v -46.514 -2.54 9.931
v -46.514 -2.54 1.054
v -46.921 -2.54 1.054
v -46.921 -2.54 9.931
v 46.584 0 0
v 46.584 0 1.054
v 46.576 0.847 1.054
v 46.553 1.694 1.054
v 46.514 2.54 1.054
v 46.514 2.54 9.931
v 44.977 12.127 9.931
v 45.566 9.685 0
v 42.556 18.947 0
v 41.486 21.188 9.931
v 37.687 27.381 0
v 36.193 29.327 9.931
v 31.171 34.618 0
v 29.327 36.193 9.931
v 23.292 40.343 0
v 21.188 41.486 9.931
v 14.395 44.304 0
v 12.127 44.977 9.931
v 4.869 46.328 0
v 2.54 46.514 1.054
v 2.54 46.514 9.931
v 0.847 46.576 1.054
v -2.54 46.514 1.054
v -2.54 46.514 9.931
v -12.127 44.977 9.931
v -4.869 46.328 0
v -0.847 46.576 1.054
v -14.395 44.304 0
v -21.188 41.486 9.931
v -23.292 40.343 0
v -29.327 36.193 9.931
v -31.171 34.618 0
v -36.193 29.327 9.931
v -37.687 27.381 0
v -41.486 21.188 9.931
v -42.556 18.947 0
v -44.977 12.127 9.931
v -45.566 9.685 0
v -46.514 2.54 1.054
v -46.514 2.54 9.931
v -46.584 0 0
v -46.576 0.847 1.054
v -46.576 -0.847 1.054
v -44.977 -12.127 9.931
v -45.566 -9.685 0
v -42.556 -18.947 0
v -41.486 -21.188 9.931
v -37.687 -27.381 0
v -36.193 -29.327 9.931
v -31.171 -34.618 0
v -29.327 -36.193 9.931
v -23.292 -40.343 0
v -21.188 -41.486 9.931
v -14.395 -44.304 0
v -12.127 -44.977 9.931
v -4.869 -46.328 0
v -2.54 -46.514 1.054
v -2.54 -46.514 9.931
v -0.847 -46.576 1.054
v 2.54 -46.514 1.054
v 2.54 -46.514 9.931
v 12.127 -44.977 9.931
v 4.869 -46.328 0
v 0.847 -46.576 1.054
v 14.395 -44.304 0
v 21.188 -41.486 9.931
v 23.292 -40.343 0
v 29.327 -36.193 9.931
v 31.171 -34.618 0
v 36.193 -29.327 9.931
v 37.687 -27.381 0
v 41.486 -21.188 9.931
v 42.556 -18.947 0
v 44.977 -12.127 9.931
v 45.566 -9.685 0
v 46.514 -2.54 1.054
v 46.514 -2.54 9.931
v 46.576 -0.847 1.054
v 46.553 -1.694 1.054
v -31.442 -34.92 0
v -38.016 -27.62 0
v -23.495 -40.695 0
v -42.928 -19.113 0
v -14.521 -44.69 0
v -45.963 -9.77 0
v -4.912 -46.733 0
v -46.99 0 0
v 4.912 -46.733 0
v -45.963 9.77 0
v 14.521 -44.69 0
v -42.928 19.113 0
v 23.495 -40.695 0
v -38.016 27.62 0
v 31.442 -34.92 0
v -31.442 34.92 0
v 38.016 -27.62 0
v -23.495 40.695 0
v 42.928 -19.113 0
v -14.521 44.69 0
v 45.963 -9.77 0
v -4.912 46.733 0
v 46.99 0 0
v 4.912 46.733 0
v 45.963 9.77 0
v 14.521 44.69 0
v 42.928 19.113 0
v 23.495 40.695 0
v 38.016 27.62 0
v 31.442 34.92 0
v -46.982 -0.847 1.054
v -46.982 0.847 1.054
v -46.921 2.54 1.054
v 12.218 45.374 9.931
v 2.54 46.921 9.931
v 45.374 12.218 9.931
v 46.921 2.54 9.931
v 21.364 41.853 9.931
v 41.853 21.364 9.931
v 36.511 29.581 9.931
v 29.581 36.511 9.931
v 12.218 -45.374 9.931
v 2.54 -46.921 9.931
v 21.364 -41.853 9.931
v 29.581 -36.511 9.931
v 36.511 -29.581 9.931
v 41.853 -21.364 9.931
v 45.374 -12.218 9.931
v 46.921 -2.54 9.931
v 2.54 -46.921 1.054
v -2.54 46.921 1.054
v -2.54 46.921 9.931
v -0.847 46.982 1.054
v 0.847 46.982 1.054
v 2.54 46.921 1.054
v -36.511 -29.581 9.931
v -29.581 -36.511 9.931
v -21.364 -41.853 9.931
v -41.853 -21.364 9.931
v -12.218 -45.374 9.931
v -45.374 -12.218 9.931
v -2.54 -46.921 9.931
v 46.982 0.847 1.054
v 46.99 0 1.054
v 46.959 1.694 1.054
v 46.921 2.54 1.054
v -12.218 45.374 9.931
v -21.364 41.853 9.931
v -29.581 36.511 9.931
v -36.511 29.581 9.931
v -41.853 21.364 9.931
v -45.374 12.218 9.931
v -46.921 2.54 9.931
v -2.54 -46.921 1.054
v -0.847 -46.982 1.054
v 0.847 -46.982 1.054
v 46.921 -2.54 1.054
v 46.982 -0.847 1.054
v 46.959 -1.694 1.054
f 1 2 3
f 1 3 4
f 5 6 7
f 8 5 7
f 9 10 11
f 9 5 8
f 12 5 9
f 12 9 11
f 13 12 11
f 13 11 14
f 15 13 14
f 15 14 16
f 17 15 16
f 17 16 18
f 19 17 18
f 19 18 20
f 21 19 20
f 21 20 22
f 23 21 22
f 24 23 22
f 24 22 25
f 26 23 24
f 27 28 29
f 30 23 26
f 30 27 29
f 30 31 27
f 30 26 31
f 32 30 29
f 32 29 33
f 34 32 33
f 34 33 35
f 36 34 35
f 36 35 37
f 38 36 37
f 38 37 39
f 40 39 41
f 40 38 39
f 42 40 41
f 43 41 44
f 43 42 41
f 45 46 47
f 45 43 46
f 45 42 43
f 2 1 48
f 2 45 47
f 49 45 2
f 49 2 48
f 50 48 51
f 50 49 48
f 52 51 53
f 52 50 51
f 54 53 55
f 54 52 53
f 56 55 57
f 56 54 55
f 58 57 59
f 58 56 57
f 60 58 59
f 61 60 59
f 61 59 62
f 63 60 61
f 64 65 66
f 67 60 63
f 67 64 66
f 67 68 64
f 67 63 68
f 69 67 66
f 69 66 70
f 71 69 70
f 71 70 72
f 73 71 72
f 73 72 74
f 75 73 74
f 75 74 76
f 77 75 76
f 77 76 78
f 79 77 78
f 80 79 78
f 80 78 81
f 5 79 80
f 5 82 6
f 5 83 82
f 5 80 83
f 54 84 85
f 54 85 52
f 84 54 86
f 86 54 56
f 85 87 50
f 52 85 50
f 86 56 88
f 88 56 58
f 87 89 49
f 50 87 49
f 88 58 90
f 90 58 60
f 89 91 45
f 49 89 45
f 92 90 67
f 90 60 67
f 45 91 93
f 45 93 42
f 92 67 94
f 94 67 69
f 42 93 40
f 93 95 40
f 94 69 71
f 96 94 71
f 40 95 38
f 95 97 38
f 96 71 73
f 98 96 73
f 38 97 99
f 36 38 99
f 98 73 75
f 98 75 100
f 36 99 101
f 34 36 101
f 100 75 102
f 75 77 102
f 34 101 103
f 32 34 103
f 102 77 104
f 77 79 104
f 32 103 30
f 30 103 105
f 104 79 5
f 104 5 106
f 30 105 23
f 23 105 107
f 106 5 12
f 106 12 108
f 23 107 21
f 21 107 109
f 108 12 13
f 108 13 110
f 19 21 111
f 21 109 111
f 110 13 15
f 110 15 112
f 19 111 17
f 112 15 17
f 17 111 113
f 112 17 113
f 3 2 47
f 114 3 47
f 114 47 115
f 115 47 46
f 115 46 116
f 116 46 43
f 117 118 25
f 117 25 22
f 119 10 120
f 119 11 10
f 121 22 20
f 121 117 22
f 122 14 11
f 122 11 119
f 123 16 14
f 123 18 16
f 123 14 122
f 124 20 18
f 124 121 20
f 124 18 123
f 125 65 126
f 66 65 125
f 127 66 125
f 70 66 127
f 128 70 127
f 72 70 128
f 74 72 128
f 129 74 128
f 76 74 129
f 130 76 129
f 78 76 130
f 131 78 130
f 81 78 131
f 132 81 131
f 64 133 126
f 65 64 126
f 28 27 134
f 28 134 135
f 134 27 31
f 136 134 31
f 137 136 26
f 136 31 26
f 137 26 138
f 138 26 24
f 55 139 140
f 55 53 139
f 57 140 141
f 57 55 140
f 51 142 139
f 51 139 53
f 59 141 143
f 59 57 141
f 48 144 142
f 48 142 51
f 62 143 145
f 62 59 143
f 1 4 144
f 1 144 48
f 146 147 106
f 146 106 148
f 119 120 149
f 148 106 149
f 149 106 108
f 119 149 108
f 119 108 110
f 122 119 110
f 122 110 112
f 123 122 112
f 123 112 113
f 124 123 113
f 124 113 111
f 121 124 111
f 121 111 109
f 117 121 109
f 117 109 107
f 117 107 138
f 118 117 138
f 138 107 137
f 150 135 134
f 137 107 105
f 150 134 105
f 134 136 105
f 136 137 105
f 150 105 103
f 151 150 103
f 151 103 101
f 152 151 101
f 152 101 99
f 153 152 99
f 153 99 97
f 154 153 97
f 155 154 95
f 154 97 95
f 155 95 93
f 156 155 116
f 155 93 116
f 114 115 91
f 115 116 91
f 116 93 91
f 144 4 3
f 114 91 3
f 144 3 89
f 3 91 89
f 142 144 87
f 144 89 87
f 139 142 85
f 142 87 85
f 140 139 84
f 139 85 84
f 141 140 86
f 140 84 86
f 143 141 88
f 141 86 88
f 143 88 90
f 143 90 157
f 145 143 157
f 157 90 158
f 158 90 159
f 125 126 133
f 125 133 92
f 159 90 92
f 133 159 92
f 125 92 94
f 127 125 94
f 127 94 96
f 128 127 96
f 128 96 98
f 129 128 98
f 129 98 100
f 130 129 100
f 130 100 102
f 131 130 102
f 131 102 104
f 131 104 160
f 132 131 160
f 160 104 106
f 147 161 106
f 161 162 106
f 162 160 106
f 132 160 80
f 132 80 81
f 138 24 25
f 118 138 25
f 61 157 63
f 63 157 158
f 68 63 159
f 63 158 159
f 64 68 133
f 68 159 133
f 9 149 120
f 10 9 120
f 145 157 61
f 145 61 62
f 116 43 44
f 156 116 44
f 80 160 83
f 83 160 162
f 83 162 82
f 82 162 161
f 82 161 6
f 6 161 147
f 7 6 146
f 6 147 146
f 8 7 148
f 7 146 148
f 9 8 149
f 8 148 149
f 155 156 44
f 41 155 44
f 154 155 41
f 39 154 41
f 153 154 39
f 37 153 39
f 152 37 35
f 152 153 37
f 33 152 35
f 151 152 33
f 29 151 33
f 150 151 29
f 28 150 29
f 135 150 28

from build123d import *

# Parameters (mm, degrees)
F0_R     = 46.99
F0_R_2   = 46.5836
F1_DEPTH = 9.9314
F2_W     = 5.08
F2_H     = 12.7
F3_DEPTH = 76.2
F4_W     = 5.08
F4_H     = 12.7
F5_DEPTH = 76.2


with BuildPart() as f1:
    # F0 (on Top) → F1 (new body)
    with BuildSketch(Plane.XY):
        Circle(F0_R)
        Circle(F0_R_2, mode=Mode.SUBTRACT)
    extrude(amount=F1_DEPTH)

    # F2 (on Right) → F3 (cut, symmetric)
    with BuildSketch(Plane.YZ):
        with Locations((0, 7.4041)):
            Rectangle(F2_W, F2_H)
    extrude(amount=F3_DEPTH, both=True, mode=Mode.SUBTRACT)

    # F4 (on Front) → F5 (cut, symmetric)
    with BuildSketch(Plane.XZ):
        with Locations((0, 7.4041)):
            Rectangle(F4_W, F4_H)
    extrude(amount=F5_DEPTH, both=True, mode=Mode.SUBTRACT)


solid = f1.part
